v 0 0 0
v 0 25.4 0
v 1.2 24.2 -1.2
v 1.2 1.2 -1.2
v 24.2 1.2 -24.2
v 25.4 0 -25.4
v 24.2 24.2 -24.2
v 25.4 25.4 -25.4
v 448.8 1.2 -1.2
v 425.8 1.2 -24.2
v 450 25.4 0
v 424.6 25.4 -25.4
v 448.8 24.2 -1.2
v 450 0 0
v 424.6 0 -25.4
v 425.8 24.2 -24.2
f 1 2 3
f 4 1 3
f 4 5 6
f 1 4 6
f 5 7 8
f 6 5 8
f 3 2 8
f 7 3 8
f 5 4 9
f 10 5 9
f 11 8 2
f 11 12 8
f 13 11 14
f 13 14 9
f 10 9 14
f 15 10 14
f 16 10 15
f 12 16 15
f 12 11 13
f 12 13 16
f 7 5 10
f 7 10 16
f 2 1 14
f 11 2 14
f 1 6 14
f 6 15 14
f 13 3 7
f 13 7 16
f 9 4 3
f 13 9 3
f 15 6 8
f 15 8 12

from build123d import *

# Parameters (mm, degrees)
SKETCH1_W           = 450
SKETCH1_H           = 25.4
BOSS_EXTRUDE1_DEPTH = 25.4
SKETCH2_W           = 23
SKETCH2_H           = 23
CUT_EXTRUDE1_DEPTH  = 450
CUT_EXTRUDE2_DEPTH  = 25.4


with BuildPart() as part:
    # Sketch1 → Boss-Extrude1 (new body)
    with BuildSketch(Plane(origin=(0, 0, 0), x_dir=(1, 0, 0), z_dir=(0, 1, 0))):
        with Locations((225, 12.7)):
            Rectangle(SKETCH1_W, SKETCH1_H)
    extrude(amount=BOSS_EXTRUDE1_DEPTH)

    # Sketch2 → Cut-Extrude1 (cut)
    with BuildSketch(Plane(origin=(450, 0, 0), x_dir=(0, 0, -1), z_dir=(1, 0, 0))):
        with Locations((12.7, 12.7)):
            Rectangle(SKETCH2_W, SKETCH2_H)
    extrude(amount=-CUT_EXTRUDE1_DEPTH, mode=Mode.SUBTRACT)

    # Sketch3 → Cut-Extrude2 (cut)
    with BuildSketch(Plane(origin=(0, 25.4, 0), x_dir=(1, 0, 0), z_dir=(0, 1, 0))):
        Polygon((0, 0), (25.4, 25.4), (0, 25.4), align=None)
        Polygon((450, 0), (424.6, 25.4), (450, 25.4), align=None)
    extrude(amount=-CUT_EXTRUDE2_DEPTH, mode=Mode.SUBTRACT)


solid = part.part
